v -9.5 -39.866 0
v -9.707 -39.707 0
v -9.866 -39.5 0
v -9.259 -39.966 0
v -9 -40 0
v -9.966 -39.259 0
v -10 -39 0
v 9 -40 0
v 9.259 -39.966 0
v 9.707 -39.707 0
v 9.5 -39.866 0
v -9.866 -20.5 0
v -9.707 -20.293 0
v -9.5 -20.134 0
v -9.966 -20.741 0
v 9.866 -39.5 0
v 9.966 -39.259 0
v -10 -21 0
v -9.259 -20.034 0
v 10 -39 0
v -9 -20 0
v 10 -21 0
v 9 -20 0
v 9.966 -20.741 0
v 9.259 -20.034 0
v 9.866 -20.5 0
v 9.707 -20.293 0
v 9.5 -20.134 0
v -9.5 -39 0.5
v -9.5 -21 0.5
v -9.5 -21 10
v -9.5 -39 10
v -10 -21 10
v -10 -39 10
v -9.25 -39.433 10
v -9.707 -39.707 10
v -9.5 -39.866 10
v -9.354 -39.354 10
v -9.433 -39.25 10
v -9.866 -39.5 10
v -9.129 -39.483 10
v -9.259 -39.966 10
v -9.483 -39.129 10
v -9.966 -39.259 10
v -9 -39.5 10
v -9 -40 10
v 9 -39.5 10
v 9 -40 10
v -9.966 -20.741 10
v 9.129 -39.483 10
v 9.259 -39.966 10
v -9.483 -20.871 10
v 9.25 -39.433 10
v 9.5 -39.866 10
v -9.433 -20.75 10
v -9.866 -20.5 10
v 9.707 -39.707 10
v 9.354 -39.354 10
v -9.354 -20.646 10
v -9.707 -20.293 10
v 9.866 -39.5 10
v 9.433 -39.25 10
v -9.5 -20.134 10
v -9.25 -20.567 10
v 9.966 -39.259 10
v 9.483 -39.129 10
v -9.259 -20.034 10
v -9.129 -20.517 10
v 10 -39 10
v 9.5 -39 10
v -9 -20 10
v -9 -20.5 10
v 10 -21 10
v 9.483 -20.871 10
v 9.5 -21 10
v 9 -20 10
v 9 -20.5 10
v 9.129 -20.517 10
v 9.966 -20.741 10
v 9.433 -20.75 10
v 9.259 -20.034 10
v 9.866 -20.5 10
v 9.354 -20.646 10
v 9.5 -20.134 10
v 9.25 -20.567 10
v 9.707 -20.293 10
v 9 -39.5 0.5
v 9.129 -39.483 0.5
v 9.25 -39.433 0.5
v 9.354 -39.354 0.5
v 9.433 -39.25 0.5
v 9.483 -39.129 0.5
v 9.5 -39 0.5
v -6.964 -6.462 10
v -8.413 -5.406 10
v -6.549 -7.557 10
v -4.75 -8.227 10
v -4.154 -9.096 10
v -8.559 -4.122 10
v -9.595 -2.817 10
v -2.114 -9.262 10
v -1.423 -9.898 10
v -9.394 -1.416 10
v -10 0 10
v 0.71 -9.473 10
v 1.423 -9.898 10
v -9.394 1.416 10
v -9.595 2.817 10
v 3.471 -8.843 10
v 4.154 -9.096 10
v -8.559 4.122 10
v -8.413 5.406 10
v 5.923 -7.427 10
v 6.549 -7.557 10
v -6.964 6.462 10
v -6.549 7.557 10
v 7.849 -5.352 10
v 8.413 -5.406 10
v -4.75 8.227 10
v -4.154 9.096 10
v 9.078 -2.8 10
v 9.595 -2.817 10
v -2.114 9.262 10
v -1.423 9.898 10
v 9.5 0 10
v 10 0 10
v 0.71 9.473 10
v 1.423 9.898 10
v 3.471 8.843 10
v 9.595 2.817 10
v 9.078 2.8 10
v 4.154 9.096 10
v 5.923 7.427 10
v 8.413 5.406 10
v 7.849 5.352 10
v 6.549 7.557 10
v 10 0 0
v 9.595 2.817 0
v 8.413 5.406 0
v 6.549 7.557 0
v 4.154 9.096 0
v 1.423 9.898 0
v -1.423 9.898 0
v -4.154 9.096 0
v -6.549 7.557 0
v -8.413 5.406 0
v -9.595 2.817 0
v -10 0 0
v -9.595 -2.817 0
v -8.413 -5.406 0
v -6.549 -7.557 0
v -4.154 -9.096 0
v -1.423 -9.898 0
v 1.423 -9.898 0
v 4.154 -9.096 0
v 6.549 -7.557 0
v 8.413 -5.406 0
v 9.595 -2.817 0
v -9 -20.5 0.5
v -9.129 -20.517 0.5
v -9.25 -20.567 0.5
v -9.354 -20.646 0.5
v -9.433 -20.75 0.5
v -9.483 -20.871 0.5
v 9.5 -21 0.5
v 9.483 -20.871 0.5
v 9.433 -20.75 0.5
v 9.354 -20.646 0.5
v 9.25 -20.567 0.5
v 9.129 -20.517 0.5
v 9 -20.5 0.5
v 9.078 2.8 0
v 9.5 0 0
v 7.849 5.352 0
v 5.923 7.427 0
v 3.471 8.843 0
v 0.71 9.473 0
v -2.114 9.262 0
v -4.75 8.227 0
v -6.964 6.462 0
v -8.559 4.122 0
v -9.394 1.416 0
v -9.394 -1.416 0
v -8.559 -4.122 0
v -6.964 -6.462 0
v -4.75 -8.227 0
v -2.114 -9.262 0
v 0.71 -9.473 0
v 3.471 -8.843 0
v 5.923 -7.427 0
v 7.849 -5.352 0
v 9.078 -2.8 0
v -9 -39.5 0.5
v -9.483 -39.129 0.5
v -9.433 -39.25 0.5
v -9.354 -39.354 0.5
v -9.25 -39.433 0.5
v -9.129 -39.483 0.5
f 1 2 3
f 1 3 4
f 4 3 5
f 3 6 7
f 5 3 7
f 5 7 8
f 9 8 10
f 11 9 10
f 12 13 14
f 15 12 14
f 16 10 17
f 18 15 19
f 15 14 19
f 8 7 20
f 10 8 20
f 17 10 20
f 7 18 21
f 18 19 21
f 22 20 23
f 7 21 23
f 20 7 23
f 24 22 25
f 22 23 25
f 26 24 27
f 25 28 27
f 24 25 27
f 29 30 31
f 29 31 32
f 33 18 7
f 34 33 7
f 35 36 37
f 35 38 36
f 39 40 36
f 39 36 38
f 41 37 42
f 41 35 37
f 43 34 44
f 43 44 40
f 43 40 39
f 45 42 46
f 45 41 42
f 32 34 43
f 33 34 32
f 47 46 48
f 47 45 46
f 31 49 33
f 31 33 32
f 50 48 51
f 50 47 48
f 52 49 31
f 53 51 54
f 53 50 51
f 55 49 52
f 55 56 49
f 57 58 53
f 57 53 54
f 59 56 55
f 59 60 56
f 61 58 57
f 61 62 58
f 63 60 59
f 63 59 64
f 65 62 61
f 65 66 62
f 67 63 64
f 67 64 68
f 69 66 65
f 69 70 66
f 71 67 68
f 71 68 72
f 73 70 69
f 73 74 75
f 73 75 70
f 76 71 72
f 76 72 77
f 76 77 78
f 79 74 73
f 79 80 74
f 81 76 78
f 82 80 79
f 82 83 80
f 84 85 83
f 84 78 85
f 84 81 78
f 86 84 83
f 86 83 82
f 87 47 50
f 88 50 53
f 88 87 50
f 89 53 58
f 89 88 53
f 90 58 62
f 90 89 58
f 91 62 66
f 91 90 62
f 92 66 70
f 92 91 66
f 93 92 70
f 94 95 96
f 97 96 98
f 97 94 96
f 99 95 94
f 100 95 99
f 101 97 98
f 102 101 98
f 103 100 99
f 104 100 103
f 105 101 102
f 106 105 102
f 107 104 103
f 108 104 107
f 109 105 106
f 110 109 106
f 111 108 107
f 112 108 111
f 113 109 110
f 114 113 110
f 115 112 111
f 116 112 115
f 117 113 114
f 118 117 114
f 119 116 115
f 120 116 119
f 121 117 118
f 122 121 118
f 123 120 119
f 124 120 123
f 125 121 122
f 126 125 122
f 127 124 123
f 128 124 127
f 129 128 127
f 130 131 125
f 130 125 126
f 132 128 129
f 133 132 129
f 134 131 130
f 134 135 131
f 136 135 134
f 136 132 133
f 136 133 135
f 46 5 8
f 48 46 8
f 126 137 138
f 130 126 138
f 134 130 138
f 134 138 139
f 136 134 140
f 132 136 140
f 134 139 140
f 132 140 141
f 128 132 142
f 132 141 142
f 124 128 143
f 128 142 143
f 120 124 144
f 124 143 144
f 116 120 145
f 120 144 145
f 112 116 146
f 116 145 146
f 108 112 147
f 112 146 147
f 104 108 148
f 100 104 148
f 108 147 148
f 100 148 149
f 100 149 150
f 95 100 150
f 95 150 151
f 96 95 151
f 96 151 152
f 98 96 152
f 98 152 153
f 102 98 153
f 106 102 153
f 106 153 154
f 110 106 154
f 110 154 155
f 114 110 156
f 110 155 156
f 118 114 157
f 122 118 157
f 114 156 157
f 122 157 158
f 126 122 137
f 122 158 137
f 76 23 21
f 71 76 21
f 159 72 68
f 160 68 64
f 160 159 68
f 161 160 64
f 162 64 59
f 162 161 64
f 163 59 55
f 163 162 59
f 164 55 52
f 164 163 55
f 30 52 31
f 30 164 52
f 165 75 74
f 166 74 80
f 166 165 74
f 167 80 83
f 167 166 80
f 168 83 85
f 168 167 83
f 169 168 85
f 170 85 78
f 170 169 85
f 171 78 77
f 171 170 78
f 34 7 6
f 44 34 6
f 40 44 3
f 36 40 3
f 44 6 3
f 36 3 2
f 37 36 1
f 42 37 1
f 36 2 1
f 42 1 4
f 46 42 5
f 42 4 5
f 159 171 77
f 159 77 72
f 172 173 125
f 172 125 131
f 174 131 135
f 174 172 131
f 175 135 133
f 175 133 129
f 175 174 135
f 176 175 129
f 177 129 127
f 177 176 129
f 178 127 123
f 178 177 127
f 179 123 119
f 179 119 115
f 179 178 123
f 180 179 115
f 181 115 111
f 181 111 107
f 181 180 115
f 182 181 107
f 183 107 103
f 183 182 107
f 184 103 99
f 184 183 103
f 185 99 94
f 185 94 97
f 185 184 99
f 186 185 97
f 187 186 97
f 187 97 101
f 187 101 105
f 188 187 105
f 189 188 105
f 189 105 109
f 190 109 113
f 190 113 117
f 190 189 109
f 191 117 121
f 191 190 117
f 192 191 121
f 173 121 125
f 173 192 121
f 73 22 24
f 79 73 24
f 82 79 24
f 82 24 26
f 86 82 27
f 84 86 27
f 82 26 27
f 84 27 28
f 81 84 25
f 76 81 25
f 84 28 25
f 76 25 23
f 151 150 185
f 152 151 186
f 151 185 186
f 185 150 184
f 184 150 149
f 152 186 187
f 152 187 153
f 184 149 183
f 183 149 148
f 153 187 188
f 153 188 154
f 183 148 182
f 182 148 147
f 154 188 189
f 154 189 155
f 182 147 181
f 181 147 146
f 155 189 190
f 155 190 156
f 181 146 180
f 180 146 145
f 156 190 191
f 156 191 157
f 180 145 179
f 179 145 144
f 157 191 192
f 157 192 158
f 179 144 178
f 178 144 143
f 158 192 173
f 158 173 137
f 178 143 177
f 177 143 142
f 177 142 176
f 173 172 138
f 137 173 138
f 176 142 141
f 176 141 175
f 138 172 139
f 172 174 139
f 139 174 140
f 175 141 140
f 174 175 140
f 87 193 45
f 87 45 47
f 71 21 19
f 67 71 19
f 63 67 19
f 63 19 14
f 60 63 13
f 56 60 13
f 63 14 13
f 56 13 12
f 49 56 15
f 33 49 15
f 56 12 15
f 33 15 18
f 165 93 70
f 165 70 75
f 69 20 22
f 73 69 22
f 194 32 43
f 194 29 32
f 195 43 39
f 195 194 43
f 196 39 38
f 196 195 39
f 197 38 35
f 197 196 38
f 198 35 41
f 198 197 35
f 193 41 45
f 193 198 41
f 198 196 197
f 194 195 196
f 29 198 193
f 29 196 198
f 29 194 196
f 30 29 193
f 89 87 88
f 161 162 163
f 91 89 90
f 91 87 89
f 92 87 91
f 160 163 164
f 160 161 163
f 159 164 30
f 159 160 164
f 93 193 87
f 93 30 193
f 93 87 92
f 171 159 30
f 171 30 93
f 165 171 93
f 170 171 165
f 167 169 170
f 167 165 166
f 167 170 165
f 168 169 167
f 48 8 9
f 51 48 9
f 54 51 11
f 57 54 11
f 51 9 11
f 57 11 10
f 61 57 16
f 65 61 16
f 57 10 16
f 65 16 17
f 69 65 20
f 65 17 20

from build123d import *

# Parameters (mm, degrees)
F0_R     = 10
F0_R_2   = 9.5
F1_DEPTH = 10
F3_DEPTH = 10
F4_T     = -0.5


with BuildPart() as f1:
    # F0 (on Top) → F1 (new body)
    with BuildSketch(Plane.XY):
        Circle(F0_R)
        Circle(F0_R_2, mode=Mode.SUBTRACT)
    extrude(amount=F1_DEPTH)


with BuildPart() as f3:
    # F2 (on Top) → F3 (new body)
    with BuildSketch(Plane.XY):
        with BuildLine():
            Line((-9, -40), (9, -40))
            ThreePointArc((9, -40), (9.707107, -39.707107), (10, -39))
            Line((10, -39), (10, -21))
            ThreePointArc((10, -21), (9.707107, -20.292893), (9, -20))
            Line((9, -20), (-9, -20))
            ThreePointArc((-9, -20), (-9.707107, -20.292893), (-10, -21))
            Line((-10, -21), (-10, -39))
            ThreePointArc((-10, -39), (-9.707107, -39.707107), (-9, -40))
        make_face()
    extrude(amount=F3_DEPTH)

    # F4
    f4_openings = [f3.faces().sort_by_distance(p)[0] for p in [
        (0, -30, 10),
    ]]
    offset(amount=F4_T, openings=f4_openings)


solid = Compound([f1.part, f3.part])
